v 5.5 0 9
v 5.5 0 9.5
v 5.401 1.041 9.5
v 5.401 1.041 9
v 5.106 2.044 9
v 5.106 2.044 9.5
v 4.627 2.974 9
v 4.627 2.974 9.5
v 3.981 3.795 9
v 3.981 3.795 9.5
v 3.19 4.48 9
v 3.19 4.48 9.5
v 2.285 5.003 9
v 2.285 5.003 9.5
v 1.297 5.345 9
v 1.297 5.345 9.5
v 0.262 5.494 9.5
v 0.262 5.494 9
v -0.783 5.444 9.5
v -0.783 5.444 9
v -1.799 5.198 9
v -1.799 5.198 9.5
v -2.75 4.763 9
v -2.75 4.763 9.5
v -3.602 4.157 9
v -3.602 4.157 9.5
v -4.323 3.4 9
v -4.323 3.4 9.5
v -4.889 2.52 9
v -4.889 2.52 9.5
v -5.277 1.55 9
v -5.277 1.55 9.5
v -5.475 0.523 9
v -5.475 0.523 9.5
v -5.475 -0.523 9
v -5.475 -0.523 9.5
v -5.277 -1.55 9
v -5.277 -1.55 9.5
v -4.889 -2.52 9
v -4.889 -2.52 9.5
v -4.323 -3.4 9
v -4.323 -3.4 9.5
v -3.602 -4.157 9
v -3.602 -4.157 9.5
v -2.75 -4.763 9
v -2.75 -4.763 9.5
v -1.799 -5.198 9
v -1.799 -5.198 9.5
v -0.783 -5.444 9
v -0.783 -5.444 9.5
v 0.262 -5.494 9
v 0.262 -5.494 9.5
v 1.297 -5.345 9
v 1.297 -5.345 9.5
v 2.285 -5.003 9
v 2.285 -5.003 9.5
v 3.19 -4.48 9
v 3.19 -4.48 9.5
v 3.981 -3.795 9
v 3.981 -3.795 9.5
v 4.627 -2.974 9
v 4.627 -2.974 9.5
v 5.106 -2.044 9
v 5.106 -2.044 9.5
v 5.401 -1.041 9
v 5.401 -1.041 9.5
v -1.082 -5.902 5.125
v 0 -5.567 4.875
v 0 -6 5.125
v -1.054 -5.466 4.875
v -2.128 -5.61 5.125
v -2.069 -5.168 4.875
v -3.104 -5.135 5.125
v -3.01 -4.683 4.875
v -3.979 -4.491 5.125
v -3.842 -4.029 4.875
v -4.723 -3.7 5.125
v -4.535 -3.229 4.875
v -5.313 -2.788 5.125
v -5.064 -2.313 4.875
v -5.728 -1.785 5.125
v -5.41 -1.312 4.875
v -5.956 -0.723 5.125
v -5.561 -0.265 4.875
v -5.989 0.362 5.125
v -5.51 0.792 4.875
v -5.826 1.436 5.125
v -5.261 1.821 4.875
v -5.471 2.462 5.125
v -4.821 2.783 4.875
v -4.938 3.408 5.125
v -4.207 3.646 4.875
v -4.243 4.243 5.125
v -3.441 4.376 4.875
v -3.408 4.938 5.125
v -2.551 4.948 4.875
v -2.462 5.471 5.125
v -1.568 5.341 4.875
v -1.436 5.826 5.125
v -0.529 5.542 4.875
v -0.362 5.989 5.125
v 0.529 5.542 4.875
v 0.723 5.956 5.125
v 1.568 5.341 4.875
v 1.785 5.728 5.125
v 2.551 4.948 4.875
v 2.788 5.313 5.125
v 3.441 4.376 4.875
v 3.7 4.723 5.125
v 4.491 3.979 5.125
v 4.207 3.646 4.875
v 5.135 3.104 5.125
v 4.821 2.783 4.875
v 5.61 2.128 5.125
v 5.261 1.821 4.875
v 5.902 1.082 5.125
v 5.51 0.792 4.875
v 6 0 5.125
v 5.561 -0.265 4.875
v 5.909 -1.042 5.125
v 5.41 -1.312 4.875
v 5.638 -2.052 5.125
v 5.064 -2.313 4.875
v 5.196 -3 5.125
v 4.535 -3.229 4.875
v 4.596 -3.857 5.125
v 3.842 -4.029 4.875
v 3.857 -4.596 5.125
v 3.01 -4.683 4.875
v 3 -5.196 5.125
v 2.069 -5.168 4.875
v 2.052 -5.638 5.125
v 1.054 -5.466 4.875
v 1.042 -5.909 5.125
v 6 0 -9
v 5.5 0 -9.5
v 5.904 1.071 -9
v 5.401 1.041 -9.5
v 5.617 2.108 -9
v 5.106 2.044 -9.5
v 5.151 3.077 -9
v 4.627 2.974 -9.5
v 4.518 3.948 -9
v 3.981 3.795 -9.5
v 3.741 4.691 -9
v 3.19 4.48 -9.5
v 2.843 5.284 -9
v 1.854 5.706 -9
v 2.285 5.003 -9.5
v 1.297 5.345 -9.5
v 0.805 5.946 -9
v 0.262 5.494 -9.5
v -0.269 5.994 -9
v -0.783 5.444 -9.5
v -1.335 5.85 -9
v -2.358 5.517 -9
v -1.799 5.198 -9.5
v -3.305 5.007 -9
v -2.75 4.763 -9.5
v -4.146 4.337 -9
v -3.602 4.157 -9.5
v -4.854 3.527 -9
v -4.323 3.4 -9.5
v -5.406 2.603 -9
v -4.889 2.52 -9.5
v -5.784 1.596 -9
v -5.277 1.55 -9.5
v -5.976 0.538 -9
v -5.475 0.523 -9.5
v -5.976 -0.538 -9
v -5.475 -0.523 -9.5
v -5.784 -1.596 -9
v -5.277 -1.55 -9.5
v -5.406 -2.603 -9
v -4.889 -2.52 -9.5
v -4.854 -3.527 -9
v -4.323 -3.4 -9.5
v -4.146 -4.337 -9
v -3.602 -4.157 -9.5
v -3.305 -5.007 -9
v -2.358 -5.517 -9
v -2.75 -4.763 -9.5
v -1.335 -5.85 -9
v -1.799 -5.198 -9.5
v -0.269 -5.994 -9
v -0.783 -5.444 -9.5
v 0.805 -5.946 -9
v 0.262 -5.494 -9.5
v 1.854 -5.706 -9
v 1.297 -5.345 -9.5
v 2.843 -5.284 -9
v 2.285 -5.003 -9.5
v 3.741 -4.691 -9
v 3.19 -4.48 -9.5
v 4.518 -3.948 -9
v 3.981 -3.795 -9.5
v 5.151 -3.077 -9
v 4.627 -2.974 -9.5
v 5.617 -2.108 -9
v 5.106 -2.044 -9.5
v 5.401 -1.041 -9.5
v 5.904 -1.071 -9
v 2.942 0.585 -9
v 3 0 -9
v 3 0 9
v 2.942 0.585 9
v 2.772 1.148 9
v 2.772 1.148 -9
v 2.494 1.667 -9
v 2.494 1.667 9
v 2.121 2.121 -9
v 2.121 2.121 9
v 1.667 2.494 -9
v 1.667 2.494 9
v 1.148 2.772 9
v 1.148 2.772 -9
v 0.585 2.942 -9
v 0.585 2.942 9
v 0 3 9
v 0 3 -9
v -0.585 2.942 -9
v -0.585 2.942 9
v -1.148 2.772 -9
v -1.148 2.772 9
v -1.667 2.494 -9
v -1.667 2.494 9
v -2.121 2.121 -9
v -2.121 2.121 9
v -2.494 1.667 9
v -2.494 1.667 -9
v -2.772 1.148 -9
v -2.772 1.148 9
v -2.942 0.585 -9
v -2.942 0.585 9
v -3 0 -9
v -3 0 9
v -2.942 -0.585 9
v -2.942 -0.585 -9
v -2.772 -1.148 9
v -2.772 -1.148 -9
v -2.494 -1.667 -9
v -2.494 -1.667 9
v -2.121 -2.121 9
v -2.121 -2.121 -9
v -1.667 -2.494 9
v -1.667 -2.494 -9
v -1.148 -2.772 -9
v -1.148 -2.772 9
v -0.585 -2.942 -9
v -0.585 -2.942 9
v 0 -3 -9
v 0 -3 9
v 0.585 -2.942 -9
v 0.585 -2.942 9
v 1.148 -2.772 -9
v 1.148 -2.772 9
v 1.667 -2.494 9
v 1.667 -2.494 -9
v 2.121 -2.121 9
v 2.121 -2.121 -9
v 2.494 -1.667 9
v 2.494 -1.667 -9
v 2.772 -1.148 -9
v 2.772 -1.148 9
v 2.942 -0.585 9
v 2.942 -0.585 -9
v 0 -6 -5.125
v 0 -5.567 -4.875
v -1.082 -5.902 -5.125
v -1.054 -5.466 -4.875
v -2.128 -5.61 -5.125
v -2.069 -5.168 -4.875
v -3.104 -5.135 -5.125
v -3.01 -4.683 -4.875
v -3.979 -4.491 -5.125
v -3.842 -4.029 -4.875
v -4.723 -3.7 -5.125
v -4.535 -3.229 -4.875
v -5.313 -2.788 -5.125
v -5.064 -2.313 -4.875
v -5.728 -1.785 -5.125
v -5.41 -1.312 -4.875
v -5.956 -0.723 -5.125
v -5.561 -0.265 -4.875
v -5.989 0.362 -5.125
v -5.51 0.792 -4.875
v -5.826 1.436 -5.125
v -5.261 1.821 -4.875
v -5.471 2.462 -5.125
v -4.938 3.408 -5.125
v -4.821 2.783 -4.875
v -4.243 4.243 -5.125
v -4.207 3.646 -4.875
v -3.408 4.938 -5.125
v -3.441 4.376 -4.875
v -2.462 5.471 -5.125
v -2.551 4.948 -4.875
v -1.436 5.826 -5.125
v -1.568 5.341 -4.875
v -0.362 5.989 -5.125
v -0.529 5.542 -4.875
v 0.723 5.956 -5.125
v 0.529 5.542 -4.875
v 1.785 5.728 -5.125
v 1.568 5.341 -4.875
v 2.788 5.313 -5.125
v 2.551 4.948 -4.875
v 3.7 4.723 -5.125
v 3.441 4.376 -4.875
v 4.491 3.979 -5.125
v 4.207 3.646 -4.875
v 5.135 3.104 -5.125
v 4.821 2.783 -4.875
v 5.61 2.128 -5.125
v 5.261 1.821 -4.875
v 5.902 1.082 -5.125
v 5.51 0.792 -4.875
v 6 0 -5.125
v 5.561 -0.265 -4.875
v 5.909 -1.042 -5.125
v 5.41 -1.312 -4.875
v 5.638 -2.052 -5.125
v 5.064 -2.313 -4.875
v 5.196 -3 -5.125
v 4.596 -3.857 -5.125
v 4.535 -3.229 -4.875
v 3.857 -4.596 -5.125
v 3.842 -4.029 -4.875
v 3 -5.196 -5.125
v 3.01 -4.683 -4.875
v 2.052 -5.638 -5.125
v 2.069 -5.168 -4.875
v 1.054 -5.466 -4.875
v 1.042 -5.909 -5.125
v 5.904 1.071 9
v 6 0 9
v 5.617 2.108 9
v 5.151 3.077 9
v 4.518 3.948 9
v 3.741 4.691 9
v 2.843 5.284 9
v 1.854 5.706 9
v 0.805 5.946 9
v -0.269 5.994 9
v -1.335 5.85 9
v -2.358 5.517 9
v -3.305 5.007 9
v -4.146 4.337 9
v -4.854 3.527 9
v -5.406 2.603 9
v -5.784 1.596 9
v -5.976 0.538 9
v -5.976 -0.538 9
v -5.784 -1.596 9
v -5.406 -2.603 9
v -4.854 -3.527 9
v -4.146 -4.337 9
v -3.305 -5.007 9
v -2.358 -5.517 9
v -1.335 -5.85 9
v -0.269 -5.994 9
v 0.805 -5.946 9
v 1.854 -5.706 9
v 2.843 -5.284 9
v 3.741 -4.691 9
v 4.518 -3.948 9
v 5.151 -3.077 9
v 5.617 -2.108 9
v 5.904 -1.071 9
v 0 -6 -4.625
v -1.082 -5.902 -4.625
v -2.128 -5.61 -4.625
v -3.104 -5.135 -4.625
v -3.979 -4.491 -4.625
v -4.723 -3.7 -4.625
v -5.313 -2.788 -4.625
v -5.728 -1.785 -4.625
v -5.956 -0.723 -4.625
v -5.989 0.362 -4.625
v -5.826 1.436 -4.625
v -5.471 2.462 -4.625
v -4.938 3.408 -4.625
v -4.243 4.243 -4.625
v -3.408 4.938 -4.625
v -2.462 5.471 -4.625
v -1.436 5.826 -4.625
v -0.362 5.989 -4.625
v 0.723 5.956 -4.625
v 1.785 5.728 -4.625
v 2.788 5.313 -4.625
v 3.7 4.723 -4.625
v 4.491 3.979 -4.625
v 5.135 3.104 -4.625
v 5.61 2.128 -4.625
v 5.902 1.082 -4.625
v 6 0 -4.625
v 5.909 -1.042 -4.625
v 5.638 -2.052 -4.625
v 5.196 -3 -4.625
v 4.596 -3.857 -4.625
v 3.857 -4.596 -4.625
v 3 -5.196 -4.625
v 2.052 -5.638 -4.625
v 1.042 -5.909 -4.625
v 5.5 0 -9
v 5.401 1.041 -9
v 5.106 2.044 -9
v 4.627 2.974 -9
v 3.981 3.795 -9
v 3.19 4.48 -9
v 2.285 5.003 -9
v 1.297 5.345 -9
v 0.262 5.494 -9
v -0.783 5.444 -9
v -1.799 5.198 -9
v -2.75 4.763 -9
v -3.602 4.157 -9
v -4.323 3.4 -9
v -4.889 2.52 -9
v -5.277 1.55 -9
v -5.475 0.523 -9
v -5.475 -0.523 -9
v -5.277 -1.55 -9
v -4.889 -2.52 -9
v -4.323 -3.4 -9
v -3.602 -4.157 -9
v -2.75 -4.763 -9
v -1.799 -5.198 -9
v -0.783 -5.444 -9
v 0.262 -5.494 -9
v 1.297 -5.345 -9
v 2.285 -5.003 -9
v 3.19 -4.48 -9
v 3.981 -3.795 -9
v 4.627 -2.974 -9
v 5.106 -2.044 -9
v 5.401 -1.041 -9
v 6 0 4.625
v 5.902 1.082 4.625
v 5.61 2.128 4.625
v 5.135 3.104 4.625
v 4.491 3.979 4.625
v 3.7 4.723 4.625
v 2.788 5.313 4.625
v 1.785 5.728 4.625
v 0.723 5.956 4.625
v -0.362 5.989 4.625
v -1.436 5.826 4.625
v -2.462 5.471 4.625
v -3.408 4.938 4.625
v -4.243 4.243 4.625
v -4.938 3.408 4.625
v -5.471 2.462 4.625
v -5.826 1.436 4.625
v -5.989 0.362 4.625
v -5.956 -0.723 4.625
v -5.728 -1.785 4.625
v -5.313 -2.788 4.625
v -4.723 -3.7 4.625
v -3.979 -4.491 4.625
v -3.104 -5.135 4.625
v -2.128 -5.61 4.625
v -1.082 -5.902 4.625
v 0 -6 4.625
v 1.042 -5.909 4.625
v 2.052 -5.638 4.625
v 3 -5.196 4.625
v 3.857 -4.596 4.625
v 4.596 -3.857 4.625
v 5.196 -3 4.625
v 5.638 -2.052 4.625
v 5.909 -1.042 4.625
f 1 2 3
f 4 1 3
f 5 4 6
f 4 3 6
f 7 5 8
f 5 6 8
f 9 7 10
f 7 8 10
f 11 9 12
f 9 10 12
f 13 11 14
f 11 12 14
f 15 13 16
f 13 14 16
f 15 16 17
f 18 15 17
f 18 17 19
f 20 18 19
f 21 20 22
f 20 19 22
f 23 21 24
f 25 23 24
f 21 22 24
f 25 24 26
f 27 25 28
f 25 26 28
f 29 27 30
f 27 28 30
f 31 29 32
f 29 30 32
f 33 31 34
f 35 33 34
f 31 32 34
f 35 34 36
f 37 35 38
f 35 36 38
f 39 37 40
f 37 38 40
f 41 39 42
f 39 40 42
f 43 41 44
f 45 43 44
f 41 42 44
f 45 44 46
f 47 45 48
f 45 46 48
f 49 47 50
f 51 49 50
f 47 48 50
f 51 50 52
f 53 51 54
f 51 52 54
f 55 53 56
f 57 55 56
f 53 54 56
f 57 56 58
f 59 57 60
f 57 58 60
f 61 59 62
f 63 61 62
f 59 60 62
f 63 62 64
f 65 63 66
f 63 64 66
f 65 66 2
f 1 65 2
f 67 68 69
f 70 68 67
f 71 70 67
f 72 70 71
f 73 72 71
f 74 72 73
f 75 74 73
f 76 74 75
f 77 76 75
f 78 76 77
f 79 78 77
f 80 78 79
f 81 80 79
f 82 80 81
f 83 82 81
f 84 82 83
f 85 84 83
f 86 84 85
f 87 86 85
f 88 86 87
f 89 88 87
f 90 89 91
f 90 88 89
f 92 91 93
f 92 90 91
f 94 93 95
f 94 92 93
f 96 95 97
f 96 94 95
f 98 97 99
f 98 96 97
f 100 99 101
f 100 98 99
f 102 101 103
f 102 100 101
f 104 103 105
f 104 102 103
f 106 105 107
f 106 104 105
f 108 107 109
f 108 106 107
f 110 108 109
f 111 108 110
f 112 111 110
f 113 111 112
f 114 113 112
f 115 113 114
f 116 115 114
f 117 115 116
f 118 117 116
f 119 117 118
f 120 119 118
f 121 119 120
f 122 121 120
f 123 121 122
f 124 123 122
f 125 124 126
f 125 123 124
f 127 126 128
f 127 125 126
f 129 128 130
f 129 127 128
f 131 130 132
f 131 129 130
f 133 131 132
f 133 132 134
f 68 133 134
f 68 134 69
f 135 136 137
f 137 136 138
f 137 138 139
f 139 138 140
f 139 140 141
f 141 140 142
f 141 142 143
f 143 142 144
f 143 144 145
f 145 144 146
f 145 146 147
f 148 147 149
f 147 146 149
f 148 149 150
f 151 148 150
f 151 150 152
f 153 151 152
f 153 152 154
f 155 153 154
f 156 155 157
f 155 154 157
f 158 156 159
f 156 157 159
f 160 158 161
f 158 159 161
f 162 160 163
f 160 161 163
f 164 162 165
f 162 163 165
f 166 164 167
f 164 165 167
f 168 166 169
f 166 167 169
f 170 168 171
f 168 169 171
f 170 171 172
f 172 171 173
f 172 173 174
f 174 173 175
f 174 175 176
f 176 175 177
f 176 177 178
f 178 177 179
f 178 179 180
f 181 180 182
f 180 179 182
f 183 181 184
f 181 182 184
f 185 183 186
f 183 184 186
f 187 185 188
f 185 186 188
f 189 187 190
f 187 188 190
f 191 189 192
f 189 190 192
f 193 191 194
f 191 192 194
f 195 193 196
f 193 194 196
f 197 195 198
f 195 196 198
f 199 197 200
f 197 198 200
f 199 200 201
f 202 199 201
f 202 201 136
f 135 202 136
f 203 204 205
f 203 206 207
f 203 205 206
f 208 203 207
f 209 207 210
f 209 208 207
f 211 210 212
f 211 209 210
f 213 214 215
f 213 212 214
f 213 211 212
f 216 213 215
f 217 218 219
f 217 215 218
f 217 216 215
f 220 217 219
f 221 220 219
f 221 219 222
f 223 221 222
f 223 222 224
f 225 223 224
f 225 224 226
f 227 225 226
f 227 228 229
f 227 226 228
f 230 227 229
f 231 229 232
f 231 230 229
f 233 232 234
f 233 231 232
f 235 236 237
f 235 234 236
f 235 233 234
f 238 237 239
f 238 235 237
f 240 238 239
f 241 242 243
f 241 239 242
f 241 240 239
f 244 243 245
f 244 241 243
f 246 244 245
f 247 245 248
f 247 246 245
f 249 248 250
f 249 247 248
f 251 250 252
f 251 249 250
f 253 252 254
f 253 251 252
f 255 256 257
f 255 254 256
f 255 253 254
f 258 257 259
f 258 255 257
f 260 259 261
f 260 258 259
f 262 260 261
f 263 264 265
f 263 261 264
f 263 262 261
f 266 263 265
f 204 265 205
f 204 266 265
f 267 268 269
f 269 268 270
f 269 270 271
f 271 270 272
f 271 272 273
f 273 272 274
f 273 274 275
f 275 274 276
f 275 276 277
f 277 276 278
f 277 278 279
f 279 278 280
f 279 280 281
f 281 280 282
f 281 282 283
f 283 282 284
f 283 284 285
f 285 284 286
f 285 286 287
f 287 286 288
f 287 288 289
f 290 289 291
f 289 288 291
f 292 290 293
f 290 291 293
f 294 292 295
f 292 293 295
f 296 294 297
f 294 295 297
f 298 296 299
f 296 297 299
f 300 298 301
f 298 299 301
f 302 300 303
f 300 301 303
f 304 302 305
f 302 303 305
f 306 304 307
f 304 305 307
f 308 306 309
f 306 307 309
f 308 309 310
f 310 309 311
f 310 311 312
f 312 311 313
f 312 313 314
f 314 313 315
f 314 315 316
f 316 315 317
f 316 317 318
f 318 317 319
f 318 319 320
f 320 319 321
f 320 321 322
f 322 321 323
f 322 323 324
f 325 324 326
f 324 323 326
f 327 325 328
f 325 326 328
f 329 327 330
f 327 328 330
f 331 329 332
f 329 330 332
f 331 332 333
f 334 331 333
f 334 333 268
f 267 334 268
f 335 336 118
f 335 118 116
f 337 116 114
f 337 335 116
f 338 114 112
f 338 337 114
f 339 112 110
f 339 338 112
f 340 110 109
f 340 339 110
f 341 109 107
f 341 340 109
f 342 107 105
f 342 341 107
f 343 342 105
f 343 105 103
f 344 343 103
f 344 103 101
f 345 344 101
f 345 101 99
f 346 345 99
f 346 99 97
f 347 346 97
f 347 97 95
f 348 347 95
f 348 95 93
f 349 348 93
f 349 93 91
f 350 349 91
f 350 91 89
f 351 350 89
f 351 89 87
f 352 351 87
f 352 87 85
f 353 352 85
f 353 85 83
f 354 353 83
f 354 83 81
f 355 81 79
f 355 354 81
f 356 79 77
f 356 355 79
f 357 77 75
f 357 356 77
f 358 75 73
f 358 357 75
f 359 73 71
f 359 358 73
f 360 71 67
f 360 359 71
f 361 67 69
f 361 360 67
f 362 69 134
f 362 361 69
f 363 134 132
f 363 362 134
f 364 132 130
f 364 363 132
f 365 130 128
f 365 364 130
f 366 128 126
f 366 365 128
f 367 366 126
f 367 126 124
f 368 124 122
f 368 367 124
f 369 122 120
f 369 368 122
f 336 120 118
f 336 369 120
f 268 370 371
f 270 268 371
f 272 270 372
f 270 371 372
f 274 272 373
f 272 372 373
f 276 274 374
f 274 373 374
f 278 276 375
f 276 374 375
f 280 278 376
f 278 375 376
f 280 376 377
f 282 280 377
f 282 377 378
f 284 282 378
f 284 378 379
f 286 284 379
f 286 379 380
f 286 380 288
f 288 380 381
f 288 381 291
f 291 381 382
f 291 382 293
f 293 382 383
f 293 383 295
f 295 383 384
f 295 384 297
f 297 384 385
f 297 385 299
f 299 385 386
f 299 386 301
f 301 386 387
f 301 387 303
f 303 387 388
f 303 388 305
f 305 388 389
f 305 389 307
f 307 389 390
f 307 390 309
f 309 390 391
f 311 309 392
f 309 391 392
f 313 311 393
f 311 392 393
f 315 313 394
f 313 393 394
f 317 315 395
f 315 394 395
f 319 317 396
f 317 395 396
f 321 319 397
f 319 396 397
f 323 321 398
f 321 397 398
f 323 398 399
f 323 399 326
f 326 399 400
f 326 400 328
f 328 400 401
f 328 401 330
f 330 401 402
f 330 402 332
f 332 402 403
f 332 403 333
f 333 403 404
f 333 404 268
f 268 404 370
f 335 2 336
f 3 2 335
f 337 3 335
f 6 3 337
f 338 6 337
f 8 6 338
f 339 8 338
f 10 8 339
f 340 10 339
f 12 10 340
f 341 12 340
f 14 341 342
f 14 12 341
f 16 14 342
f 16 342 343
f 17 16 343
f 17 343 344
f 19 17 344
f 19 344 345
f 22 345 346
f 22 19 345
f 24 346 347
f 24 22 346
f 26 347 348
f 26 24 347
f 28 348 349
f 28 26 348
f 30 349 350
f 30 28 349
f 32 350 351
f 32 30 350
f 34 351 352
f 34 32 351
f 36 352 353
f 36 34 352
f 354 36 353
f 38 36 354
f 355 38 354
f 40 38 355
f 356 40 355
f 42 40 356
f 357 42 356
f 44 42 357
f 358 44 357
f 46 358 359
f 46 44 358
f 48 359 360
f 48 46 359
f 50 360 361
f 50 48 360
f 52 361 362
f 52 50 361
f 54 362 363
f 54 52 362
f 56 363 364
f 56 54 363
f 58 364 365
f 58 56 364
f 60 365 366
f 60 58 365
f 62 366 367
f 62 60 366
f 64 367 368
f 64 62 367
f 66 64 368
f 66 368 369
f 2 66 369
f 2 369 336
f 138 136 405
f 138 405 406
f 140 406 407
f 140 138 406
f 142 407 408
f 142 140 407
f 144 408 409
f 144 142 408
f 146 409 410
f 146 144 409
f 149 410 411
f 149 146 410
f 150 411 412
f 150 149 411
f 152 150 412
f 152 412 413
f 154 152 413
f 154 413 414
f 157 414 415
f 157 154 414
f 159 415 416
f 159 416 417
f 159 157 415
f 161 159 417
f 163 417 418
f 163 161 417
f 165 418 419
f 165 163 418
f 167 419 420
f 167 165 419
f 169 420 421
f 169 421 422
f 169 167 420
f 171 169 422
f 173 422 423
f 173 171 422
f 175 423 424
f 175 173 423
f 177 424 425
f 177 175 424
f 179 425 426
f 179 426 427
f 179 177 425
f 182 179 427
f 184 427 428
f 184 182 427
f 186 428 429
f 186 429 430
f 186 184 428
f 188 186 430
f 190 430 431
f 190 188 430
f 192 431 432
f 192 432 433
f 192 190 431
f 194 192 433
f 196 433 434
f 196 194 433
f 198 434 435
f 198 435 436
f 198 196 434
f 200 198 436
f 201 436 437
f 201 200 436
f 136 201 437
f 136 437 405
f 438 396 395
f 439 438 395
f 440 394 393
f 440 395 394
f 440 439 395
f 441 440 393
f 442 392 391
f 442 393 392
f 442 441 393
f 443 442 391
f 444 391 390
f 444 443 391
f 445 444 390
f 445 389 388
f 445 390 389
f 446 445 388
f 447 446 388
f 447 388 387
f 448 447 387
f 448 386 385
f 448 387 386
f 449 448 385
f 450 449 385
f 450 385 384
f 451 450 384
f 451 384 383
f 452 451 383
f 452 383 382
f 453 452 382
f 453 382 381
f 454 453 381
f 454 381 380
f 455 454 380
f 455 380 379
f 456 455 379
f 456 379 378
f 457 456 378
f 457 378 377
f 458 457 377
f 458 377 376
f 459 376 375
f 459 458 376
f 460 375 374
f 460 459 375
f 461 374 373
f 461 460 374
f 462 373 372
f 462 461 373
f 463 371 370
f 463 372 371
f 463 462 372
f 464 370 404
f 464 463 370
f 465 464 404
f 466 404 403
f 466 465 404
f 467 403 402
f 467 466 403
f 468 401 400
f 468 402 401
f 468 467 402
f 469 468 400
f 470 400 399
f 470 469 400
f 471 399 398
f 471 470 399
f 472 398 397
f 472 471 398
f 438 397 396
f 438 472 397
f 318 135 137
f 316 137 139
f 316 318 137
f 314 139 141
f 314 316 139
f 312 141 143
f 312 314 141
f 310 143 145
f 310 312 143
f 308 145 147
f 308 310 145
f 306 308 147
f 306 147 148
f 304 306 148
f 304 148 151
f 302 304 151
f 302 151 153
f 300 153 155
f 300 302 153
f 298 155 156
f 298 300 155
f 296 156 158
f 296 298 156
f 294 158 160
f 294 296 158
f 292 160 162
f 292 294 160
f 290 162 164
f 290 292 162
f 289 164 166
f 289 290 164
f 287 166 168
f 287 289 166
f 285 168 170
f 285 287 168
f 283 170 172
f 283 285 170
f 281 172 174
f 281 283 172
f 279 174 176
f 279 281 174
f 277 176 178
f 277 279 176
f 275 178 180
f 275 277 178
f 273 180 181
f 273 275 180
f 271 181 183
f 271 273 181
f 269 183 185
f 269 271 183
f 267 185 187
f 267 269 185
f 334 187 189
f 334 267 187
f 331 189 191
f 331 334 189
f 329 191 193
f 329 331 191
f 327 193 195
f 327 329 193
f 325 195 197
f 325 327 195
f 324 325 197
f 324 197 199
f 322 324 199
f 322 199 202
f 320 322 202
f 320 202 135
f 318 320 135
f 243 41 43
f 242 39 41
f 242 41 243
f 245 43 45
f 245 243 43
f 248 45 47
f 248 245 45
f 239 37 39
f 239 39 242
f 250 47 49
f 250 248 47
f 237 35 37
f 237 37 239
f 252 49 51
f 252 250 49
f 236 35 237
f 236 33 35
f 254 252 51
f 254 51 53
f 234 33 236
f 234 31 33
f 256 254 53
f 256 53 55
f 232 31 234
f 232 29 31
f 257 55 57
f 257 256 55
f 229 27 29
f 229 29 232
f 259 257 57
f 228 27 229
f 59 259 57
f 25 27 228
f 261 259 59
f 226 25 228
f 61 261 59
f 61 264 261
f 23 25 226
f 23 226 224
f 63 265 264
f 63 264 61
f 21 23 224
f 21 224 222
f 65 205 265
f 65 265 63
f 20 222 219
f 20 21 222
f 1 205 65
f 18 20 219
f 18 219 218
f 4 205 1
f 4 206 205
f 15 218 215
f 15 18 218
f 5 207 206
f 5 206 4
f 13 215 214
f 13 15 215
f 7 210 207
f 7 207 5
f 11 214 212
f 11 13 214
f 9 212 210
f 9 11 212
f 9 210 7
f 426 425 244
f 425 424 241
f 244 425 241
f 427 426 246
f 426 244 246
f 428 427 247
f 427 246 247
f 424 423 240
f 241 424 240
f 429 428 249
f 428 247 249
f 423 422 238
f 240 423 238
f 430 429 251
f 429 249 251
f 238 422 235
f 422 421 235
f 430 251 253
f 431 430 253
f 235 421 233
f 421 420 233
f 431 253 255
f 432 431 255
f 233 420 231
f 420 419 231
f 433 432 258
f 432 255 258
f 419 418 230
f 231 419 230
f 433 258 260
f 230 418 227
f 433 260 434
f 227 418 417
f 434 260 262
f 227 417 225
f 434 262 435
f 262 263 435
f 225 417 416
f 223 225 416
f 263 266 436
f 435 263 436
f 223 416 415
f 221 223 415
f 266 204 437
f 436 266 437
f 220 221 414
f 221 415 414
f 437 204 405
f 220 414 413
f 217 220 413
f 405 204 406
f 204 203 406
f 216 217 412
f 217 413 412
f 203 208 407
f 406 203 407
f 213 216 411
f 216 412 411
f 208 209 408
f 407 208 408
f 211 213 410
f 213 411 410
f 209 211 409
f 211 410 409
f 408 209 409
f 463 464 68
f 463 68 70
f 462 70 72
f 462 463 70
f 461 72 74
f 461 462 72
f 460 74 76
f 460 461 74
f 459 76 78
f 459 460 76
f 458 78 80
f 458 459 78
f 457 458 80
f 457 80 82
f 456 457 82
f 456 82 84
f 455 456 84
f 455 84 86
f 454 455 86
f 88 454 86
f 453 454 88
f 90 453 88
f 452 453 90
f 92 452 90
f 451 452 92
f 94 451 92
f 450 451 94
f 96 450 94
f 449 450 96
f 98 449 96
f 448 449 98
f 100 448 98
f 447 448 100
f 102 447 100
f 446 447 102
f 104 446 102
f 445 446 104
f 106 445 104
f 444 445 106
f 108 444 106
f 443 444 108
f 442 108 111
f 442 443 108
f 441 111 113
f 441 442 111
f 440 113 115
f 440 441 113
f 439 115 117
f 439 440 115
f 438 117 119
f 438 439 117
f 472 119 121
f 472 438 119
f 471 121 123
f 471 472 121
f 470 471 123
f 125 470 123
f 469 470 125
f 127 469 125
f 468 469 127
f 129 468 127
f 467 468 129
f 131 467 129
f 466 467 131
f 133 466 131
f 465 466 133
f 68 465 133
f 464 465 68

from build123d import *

# Parameters (mm, degrees)
SKETCH_1_R          = 6
SKETCH_1_R_2        = 3
EXTRUDE_1_DEPTH     = 9.5
CHAMFER_1_SIZE      = 0.5
SKETCH_2_R          = 5.5
CUT_EXTRUDE_1_DEPTH = 0.5


with BuildPart() as part:
    # 스케치1 → 보스-돌출1 (new, symmetric)
    with BuildSketch(Plane.XY):
        Circle(SKETCH_1_R)
        Circle(SKETCH_1_R_2, mode=Mode.SUBTRACT)
    extrude(amount=EXTRUDE_1_DEPTH, both=True)

    # 모따기1
    chamfer_1_edges = [part.edges().sort_by_distance(p)[0] for p in [
        (-6, 0, -9.5),
        (-6, 0, 9.5),
    ]]
    chamfer(chamfer_1_edges, length=CHAMFER_1_SIZE)

    # 스케치2 → 컷-돌출1 (cut)
    with BuildSketch(Plane.XY.offset(9.5)):
        Circle(SKETCH_2_R)
    cut_extrude_1 = extrude(amount=-CUT_EXTRUDE_1_DEPTH, mode=Mode.SUBTRACT)

    # 대칭 복사1: 컷-돌출1 across plane
    add(cut_extrude_1.mirror(Plane.XY), mode=Mode.SUBTRACT)

    # 스케치3 → 컷-회전1 (revolve, cut)
    with BuildSketch(Plane(origin=(0, 0, 0), x_dir=(0, 0, -1), z_dir=(1, 0, 0)), mode=Mode.PRIVATE) as cut_revolve_1_sk:
        Polygon((-4.625, 6), (-5.125, 6), (-4.875, 5.566987298), align=None)
        Polygon((4.625, 6), (5.125, 6), (4.875, 5.566987298), align=None)
    revolve(cut_revolve_1_sk.sketch.rotate(Axis((0, 0, 9), (0, 0, -1)), 180), axis=Axis((0, 0, 9), (0, 0, -1)), mode=Mode.SUBTRACT)


solid = part.part
